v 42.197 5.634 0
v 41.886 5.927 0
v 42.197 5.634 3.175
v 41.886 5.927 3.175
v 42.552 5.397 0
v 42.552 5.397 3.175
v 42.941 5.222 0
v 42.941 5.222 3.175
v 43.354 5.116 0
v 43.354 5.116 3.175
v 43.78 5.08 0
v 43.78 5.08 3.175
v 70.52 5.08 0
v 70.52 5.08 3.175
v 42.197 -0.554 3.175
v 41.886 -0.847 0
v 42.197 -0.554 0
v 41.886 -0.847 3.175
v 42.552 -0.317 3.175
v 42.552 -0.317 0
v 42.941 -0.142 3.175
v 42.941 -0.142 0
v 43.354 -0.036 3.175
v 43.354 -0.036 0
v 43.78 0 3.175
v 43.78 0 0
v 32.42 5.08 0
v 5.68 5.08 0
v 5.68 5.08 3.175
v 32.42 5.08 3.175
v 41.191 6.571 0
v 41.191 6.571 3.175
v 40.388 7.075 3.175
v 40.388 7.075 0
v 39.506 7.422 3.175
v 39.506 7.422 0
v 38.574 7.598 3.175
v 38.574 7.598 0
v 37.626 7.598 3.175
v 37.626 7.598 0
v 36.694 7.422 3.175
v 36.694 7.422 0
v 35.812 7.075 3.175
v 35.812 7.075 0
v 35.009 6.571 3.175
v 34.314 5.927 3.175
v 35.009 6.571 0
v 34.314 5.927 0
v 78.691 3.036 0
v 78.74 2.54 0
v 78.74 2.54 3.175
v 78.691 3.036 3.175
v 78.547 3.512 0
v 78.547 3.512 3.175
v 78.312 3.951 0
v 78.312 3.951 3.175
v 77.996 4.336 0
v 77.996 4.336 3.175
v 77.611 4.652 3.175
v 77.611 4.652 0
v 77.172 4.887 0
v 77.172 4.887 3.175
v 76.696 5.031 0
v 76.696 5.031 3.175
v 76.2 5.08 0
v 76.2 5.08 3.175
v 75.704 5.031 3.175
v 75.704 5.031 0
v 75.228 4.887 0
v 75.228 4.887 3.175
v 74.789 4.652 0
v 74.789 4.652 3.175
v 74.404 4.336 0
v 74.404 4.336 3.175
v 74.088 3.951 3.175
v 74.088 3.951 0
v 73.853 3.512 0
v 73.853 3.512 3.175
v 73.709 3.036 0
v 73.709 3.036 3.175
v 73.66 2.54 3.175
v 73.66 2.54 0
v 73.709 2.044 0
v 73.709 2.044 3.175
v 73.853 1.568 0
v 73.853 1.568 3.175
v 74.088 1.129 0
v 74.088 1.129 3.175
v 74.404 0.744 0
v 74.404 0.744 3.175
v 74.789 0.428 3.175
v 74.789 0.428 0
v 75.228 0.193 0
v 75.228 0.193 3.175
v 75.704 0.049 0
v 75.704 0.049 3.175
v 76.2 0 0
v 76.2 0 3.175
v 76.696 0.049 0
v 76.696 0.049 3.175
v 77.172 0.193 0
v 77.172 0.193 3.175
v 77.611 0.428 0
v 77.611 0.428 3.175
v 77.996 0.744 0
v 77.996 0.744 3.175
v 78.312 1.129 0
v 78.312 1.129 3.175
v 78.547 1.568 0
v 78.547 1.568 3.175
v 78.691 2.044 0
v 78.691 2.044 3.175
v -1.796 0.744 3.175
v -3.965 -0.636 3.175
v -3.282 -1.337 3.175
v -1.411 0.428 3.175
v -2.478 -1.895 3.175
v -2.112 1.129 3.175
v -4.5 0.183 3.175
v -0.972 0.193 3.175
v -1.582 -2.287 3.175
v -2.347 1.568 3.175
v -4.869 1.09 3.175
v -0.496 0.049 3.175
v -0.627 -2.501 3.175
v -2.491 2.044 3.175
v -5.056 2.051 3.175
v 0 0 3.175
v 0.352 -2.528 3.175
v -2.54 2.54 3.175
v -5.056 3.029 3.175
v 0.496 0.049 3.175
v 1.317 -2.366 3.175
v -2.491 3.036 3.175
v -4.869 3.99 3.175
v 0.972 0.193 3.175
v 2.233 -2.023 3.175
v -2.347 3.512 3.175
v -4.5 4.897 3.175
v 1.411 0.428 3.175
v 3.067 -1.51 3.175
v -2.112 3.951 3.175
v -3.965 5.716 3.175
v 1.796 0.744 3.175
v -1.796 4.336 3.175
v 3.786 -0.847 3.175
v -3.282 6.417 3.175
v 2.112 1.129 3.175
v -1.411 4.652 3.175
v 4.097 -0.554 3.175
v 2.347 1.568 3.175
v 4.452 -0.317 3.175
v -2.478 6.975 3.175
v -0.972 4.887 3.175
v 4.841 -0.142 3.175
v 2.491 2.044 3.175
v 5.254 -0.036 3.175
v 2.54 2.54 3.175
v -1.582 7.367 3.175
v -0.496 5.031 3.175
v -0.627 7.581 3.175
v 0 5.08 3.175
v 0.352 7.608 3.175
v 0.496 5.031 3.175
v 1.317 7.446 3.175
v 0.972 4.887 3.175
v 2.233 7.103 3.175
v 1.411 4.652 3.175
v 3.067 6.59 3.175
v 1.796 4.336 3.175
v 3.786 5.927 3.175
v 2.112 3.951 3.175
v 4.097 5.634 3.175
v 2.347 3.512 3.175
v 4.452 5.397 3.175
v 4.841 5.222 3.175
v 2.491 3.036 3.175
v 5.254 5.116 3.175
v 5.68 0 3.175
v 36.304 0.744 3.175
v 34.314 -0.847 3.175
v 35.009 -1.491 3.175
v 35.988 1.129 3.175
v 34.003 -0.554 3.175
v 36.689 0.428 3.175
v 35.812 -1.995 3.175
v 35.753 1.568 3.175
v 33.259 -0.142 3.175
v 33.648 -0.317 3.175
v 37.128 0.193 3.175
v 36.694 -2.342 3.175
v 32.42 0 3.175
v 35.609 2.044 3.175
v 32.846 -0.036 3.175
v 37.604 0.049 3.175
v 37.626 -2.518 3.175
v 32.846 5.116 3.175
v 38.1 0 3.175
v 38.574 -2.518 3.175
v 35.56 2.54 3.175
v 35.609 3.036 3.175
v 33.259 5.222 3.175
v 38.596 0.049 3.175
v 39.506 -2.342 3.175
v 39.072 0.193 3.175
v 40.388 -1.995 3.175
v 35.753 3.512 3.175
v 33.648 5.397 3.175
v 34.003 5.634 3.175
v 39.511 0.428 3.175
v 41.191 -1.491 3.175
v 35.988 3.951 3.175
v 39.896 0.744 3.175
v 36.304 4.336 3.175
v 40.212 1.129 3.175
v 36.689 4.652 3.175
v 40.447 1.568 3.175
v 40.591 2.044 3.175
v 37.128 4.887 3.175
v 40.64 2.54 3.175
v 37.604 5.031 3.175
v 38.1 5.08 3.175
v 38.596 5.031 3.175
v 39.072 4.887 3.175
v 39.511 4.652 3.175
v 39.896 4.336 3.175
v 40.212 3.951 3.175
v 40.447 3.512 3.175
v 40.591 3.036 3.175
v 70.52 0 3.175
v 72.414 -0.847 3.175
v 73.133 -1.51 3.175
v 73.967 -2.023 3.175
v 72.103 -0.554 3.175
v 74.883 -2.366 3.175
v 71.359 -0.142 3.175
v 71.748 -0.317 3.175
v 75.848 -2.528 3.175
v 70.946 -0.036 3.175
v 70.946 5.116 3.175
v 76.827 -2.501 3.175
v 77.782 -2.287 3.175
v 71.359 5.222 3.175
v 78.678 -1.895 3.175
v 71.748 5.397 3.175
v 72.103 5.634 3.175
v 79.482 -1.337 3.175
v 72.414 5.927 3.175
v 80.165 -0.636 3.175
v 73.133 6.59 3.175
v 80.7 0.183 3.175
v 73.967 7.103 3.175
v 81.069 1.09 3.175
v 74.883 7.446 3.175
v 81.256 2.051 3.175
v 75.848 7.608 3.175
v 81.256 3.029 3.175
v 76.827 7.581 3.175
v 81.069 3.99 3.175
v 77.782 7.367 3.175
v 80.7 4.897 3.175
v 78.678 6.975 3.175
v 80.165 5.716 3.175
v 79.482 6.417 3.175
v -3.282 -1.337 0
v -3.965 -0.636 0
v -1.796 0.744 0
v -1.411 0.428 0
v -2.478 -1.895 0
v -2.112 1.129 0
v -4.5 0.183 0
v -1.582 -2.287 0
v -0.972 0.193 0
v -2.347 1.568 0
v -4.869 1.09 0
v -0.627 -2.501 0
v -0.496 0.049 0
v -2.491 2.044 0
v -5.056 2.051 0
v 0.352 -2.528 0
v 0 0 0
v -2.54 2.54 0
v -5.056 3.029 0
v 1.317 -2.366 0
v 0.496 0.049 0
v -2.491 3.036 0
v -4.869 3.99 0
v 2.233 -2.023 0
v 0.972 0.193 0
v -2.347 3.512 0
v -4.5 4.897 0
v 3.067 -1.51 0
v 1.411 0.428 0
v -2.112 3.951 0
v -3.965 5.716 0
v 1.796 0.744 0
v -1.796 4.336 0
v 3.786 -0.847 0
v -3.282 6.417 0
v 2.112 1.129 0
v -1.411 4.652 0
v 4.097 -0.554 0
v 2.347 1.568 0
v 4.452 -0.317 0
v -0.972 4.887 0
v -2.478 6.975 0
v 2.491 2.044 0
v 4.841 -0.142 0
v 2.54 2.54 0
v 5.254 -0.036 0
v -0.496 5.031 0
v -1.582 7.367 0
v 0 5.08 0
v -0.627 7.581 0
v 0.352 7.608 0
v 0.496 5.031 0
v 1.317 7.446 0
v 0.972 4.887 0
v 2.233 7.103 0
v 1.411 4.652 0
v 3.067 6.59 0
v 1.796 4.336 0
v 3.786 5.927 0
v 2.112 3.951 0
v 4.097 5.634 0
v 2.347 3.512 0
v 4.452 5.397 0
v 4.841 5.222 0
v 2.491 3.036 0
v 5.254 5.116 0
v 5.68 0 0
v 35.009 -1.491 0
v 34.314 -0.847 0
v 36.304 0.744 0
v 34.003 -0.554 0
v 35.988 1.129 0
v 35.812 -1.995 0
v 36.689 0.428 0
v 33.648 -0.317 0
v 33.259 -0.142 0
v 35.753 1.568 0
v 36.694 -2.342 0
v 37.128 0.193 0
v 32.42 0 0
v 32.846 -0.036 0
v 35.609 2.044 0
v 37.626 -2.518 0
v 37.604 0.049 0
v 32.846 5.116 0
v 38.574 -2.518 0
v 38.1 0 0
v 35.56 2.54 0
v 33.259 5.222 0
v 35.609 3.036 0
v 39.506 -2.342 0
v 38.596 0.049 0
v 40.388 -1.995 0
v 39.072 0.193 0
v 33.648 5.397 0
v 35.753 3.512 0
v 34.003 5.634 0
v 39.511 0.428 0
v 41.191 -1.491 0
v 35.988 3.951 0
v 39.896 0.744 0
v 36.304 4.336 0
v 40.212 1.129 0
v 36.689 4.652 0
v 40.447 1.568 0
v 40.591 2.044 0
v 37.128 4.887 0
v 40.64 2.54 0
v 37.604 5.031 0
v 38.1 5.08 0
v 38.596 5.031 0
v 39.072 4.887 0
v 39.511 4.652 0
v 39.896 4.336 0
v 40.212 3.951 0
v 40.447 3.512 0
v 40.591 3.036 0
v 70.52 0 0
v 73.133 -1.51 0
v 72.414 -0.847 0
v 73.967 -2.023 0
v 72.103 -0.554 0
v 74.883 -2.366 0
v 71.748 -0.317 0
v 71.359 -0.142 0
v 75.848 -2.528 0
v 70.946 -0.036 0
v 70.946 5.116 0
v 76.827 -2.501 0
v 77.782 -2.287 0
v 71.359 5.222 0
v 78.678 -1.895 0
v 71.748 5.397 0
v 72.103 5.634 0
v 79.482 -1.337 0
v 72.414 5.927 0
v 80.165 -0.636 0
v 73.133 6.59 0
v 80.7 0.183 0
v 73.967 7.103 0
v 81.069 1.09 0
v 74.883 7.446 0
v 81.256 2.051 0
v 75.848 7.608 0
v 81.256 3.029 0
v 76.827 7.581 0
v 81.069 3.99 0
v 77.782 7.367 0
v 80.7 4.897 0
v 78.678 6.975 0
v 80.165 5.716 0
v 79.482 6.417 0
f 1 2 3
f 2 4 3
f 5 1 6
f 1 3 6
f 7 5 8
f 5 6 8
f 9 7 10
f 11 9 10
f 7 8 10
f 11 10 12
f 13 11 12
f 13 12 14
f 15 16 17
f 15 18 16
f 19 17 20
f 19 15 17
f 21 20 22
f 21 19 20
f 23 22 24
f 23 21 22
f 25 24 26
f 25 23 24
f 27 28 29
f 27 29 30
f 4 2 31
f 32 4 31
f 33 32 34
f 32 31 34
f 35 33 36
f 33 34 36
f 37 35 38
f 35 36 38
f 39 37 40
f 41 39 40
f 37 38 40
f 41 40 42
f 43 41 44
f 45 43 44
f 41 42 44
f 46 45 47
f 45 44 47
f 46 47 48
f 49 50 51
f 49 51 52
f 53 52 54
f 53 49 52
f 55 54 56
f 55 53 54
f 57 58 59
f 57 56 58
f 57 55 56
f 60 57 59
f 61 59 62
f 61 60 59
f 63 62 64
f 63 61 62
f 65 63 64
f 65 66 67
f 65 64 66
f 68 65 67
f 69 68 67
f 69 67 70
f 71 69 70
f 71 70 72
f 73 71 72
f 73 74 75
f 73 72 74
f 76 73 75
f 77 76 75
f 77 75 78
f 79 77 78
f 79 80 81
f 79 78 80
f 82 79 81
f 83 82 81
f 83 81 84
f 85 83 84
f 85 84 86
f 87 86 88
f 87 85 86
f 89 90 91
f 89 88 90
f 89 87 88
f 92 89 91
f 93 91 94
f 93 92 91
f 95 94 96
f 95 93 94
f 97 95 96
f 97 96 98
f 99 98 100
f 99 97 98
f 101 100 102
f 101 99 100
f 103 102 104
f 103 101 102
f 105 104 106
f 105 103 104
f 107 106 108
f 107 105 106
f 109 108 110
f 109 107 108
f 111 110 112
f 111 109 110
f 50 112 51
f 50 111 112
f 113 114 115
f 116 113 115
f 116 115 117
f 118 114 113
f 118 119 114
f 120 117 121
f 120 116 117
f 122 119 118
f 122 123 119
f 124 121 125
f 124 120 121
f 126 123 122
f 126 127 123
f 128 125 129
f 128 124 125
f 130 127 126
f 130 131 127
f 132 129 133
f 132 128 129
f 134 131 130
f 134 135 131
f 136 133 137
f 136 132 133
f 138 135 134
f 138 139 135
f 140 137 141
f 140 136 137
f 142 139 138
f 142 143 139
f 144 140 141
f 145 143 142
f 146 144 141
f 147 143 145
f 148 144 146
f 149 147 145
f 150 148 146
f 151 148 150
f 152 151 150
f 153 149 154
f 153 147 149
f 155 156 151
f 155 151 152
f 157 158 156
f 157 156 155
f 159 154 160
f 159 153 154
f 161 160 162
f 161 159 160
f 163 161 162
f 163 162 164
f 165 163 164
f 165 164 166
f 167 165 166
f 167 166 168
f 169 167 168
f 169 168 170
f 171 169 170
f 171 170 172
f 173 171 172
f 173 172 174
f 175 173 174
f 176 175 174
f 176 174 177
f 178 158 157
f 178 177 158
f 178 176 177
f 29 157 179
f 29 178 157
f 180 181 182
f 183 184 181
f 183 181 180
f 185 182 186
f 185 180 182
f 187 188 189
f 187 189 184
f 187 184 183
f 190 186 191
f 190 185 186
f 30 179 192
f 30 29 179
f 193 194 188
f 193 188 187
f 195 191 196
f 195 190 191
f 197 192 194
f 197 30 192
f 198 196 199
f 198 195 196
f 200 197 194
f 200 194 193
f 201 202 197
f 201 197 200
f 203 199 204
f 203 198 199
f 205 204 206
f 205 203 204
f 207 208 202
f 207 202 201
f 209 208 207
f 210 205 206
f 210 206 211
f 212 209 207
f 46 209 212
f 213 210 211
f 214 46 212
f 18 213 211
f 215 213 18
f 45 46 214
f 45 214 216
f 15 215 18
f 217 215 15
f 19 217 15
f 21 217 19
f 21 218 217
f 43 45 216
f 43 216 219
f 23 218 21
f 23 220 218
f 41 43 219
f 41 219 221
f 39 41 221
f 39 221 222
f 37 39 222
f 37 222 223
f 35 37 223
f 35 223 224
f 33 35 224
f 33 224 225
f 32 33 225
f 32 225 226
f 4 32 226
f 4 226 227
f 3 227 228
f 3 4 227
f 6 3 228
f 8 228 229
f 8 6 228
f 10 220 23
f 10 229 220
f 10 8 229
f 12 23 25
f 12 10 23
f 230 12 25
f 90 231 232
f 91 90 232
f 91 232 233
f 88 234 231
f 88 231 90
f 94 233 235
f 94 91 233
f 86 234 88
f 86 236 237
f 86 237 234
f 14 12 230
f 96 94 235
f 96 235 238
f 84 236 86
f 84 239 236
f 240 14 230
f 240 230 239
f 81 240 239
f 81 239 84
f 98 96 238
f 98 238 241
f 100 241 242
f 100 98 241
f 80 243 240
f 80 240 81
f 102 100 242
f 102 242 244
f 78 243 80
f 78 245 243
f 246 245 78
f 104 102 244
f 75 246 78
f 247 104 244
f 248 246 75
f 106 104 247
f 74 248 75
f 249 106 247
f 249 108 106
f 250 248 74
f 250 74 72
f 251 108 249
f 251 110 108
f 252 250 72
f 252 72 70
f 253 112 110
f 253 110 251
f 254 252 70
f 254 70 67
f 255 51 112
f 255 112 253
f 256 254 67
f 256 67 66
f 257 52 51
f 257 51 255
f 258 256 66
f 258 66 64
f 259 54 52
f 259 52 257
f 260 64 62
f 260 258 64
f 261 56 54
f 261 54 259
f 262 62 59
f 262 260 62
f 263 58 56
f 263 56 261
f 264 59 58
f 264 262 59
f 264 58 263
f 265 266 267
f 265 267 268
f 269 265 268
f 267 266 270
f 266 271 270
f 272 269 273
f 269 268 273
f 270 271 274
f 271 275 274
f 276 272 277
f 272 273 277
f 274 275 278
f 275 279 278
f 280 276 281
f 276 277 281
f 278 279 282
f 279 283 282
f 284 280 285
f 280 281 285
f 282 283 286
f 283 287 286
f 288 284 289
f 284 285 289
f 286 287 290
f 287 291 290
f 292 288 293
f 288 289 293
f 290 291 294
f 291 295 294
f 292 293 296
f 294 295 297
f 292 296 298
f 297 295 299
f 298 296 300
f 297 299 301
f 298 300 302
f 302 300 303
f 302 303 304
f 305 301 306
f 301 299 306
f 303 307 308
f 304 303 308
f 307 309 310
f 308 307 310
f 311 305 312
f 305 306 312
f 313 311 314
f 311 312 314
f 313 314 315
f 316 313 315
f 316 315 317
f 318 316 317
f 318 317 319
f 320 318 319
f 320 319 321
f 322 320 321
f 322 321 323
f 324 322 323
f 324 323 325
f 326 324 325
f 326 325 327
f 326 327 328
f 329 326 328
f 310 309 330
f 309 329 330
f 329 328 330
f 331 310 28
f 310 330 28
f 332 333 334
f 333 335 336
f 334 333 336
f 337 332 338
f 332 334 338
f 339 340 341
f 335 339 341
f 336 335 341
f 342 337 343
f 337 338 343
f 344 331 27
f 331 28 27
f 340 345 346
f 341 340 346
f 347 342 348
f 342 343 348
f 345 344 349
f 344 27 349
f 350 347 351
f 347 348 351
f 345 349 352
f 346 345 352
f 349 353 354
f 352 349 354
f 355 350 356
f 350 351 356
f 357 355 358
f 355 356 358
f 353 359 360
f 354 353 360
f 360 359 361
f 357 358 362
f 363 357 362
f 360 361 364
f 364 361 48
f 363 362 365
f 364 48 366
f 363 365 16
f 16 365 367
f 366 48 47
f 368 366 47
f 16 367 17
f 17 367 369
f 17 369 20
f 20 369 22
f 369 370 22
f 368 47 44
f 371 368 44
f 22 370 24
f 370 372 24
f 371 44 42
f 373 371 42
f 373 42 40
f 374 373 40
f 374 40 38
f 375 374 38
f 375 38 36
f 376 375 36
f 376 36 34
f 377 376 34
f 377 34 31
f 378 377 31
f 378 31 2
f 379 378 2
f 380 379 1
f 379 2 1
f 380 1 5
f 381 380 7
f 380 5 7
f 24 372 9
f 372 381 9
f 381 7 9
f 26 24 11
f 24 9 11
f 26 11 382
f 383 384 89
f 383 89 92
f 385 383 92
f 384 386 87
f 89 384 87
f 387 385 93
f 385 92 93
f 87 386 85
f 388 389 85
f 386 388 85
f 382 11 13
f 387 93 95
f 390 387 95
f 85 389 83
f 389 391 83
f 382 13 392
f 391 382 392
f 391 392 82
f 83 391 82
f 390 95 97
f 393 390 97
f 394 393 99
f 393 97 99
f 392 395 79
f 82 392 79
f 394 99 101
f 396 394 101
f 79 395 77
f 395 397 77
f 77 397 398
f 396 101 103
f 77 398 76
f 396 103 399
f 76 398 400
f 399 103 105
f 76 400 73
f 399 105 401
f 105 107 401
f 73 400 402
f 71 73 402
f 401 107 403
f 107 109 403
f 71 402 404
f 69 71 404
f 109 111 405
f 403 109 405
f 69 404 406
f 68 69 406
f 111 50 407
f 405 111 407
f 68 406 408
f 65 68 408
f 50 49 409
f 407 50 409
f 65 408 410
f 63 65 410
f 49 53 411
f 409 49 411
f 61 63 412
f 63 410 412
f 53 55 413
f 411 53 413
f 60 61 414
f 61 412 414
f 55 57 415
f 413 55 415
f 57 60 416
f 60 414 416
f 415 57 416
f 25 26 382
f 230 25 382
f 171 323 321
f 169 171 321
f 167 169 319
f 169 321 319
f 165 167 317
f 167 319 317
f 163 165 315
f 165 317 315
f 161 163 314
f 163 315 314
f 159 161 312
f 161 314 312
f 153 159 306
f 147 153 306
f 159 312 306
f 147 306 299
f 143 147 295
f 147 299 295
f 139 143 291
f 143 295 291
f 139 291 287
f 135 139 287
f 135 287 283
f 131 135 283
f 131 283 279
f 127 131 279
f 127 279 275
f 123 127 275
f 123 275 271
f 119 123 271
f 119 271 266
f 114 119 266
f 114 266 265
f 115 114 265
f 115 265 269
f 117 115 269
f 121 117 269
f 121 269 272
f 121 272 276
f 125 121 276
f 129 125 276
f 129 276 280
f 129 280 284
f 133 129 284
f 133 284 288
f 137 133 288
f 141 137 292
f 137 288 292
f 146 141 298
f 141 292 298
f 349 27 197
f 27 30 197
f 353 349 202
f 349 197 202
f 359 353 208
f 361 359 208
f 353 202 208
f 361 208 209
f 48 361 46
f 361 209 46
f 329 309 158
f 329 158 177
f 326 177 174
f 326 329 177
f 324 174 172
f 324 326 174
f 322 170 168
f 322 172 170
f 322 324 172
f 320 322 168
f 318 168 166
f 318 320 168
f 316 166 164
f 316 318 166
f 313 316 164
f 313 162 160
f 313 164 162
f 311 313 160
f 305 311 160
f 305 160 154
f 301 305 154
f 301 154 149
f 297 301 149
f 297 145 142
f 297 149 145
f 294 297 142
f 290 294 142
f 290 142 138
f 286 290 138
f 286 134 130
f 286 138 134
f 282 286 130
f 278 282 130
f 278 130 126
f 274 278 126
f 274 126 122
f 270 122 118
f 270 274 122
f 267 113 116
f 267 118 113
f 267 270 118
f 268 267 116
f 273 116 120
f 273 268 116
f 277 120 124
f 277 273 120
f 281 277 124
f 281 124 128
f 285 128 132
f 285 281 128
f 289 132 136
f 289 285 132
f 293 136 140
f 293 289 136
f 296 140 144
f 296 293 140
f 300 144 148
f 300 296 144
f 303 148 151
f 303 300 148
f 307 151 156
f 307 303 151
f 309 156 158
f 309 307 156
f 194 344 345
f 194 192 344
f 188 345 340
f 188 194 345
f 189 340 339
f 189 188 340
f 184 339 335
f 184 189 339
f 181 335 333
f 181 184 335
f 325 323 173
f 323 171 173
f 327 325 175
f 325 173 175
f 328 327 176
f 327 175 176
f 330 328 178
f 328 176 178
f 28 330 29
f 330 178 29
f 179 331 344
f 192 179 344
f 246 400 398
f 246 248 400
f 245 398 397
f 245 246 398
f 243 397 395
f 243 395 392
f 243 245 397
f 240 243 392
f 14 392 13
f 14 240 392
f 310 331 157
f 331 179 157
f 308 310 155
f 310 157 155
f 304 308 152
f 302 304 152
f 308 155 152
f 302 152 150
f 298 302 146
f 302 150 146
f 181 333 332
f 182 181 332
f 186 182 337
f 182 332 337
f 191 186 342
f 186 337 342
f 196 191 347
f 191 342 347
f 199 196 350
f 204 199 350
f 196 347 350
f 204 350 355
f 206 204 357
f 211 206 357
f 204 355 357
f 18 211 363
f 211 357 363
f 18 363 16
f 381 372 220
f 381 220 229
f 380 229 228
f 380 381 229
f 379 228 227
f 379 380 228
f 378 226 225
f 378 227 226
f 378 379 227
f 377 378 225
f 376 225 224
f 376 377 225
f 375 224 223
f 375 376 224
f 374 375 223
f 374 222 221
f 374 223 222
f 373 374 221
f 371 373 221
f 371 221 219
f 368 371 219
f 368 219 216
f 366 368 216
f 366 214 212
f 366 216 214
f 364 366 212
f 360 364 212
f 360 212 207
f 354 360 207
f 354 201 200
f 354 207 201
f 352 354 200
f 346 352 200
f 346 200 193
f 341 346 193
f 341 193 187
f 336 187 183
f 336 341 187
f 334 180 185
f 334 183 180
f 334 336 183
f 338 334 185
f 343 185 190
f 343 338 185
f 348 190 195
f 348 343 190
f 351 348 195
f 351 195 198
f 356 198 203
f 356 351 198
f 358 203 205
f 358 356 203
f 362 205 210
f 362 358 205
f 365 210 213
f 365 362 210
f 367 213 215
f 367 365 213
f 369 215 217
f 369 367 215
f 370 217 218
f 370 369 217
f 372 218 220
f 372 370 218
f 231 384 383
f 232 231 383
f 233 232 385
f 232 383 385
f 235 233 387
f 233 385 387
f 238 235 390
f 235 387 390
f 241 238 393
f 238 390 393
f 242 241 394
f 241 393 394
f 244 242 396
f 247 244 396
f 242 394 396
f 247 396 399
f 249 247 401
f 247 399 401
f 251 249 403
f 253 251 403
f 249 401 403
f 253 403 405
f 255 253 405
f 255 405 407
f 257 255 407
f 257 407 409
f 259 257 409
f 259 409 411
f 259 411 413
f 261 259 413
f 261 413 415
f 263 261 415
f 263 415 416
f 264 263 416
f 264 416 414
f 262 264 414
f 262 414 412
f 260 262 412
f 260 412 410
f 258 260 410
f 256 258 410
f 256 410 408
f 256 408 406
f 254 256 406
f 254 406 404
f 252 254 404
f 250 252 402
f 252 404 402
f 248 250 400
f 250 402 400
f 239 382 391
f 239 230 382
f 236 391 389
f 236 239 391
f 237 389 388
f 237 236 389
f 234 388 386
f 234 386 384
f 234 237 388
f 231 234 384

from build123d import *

# Parameters (mm, degrees)
SKETCH1_R               = 5.08
SKETCH1_W               = 76.2
SKETCH1_H               = 5.08
BOSS_EXTRUDE1_DEPTH     = 3.175
CUT_EXTRUDE1_DEPTH      = 82.698123754
CUT_EXTRUDE1_DEPTH_BACK = 82.698123754
SKETCH2_R               = 2.54
FILLET1_R               = 2.54


with BuildPart() as part:
    # Sketch1 → Boss-Extrude1 (new body)
    with BuildSketch(Plane.XY):
        with Locations((0, 2.54)):
            Circle(SKETCH1_R)
        with Locations((76.2, 2.54)):
            Circle(SKETCH1_R)
        with Locations((38.1, 2.54)):
            Circle(SKETCH1_R)
        with Locations((38.1, 2.54)):
            Rectangle(SKETCH1_W, SKETCH1_H)
    extrude(amount=BOSS_EXTRUDE1_DEPTH)

    # Sketch2 → Cut-Extrude1 (cut, two sides: drawn at the far end of the back side and taken through both)
    with BuildSketch(Plane.XY.offset(3.175).offset(-CUT_EXTRUDE1_DEPTH_BACK)):
        with Locations((0, 2.54)):
            Circle(SKETCH2_R)
        with Locations((76.2, 2.54)):
            Circle(SKETCH2_R)
        with Locations((38.1, 2.54)):
            Circle(SKETCH2_R)
    extrude(amount=CUT_EXTRUDE1_DEPTH + CUT_EXTRUDE1_DEPTH_BACK, mode=Mode.SUBTRACT)

    # Fillet1
    fillet1_edges = [part.edges().sort_by_distance(p)[0] for p in [
        (4.399409051, 5.08, 1.5875),
        (33.700590949, 5.08, 1.5875),
        (42.499409051, 5.08, 1.5875),
        (71.800590949, 5.08, 1.5875),
        (71.800590949, 0, 1.5875),
        (4.399409051, 0, 1.5875),
        (33.700590949, 0, 1.5875),
        (42.499409051, 0, 1.5875),
    ]]
    fillet(fillet1_edges, radius=FILLET1_R)


solid = part.part
